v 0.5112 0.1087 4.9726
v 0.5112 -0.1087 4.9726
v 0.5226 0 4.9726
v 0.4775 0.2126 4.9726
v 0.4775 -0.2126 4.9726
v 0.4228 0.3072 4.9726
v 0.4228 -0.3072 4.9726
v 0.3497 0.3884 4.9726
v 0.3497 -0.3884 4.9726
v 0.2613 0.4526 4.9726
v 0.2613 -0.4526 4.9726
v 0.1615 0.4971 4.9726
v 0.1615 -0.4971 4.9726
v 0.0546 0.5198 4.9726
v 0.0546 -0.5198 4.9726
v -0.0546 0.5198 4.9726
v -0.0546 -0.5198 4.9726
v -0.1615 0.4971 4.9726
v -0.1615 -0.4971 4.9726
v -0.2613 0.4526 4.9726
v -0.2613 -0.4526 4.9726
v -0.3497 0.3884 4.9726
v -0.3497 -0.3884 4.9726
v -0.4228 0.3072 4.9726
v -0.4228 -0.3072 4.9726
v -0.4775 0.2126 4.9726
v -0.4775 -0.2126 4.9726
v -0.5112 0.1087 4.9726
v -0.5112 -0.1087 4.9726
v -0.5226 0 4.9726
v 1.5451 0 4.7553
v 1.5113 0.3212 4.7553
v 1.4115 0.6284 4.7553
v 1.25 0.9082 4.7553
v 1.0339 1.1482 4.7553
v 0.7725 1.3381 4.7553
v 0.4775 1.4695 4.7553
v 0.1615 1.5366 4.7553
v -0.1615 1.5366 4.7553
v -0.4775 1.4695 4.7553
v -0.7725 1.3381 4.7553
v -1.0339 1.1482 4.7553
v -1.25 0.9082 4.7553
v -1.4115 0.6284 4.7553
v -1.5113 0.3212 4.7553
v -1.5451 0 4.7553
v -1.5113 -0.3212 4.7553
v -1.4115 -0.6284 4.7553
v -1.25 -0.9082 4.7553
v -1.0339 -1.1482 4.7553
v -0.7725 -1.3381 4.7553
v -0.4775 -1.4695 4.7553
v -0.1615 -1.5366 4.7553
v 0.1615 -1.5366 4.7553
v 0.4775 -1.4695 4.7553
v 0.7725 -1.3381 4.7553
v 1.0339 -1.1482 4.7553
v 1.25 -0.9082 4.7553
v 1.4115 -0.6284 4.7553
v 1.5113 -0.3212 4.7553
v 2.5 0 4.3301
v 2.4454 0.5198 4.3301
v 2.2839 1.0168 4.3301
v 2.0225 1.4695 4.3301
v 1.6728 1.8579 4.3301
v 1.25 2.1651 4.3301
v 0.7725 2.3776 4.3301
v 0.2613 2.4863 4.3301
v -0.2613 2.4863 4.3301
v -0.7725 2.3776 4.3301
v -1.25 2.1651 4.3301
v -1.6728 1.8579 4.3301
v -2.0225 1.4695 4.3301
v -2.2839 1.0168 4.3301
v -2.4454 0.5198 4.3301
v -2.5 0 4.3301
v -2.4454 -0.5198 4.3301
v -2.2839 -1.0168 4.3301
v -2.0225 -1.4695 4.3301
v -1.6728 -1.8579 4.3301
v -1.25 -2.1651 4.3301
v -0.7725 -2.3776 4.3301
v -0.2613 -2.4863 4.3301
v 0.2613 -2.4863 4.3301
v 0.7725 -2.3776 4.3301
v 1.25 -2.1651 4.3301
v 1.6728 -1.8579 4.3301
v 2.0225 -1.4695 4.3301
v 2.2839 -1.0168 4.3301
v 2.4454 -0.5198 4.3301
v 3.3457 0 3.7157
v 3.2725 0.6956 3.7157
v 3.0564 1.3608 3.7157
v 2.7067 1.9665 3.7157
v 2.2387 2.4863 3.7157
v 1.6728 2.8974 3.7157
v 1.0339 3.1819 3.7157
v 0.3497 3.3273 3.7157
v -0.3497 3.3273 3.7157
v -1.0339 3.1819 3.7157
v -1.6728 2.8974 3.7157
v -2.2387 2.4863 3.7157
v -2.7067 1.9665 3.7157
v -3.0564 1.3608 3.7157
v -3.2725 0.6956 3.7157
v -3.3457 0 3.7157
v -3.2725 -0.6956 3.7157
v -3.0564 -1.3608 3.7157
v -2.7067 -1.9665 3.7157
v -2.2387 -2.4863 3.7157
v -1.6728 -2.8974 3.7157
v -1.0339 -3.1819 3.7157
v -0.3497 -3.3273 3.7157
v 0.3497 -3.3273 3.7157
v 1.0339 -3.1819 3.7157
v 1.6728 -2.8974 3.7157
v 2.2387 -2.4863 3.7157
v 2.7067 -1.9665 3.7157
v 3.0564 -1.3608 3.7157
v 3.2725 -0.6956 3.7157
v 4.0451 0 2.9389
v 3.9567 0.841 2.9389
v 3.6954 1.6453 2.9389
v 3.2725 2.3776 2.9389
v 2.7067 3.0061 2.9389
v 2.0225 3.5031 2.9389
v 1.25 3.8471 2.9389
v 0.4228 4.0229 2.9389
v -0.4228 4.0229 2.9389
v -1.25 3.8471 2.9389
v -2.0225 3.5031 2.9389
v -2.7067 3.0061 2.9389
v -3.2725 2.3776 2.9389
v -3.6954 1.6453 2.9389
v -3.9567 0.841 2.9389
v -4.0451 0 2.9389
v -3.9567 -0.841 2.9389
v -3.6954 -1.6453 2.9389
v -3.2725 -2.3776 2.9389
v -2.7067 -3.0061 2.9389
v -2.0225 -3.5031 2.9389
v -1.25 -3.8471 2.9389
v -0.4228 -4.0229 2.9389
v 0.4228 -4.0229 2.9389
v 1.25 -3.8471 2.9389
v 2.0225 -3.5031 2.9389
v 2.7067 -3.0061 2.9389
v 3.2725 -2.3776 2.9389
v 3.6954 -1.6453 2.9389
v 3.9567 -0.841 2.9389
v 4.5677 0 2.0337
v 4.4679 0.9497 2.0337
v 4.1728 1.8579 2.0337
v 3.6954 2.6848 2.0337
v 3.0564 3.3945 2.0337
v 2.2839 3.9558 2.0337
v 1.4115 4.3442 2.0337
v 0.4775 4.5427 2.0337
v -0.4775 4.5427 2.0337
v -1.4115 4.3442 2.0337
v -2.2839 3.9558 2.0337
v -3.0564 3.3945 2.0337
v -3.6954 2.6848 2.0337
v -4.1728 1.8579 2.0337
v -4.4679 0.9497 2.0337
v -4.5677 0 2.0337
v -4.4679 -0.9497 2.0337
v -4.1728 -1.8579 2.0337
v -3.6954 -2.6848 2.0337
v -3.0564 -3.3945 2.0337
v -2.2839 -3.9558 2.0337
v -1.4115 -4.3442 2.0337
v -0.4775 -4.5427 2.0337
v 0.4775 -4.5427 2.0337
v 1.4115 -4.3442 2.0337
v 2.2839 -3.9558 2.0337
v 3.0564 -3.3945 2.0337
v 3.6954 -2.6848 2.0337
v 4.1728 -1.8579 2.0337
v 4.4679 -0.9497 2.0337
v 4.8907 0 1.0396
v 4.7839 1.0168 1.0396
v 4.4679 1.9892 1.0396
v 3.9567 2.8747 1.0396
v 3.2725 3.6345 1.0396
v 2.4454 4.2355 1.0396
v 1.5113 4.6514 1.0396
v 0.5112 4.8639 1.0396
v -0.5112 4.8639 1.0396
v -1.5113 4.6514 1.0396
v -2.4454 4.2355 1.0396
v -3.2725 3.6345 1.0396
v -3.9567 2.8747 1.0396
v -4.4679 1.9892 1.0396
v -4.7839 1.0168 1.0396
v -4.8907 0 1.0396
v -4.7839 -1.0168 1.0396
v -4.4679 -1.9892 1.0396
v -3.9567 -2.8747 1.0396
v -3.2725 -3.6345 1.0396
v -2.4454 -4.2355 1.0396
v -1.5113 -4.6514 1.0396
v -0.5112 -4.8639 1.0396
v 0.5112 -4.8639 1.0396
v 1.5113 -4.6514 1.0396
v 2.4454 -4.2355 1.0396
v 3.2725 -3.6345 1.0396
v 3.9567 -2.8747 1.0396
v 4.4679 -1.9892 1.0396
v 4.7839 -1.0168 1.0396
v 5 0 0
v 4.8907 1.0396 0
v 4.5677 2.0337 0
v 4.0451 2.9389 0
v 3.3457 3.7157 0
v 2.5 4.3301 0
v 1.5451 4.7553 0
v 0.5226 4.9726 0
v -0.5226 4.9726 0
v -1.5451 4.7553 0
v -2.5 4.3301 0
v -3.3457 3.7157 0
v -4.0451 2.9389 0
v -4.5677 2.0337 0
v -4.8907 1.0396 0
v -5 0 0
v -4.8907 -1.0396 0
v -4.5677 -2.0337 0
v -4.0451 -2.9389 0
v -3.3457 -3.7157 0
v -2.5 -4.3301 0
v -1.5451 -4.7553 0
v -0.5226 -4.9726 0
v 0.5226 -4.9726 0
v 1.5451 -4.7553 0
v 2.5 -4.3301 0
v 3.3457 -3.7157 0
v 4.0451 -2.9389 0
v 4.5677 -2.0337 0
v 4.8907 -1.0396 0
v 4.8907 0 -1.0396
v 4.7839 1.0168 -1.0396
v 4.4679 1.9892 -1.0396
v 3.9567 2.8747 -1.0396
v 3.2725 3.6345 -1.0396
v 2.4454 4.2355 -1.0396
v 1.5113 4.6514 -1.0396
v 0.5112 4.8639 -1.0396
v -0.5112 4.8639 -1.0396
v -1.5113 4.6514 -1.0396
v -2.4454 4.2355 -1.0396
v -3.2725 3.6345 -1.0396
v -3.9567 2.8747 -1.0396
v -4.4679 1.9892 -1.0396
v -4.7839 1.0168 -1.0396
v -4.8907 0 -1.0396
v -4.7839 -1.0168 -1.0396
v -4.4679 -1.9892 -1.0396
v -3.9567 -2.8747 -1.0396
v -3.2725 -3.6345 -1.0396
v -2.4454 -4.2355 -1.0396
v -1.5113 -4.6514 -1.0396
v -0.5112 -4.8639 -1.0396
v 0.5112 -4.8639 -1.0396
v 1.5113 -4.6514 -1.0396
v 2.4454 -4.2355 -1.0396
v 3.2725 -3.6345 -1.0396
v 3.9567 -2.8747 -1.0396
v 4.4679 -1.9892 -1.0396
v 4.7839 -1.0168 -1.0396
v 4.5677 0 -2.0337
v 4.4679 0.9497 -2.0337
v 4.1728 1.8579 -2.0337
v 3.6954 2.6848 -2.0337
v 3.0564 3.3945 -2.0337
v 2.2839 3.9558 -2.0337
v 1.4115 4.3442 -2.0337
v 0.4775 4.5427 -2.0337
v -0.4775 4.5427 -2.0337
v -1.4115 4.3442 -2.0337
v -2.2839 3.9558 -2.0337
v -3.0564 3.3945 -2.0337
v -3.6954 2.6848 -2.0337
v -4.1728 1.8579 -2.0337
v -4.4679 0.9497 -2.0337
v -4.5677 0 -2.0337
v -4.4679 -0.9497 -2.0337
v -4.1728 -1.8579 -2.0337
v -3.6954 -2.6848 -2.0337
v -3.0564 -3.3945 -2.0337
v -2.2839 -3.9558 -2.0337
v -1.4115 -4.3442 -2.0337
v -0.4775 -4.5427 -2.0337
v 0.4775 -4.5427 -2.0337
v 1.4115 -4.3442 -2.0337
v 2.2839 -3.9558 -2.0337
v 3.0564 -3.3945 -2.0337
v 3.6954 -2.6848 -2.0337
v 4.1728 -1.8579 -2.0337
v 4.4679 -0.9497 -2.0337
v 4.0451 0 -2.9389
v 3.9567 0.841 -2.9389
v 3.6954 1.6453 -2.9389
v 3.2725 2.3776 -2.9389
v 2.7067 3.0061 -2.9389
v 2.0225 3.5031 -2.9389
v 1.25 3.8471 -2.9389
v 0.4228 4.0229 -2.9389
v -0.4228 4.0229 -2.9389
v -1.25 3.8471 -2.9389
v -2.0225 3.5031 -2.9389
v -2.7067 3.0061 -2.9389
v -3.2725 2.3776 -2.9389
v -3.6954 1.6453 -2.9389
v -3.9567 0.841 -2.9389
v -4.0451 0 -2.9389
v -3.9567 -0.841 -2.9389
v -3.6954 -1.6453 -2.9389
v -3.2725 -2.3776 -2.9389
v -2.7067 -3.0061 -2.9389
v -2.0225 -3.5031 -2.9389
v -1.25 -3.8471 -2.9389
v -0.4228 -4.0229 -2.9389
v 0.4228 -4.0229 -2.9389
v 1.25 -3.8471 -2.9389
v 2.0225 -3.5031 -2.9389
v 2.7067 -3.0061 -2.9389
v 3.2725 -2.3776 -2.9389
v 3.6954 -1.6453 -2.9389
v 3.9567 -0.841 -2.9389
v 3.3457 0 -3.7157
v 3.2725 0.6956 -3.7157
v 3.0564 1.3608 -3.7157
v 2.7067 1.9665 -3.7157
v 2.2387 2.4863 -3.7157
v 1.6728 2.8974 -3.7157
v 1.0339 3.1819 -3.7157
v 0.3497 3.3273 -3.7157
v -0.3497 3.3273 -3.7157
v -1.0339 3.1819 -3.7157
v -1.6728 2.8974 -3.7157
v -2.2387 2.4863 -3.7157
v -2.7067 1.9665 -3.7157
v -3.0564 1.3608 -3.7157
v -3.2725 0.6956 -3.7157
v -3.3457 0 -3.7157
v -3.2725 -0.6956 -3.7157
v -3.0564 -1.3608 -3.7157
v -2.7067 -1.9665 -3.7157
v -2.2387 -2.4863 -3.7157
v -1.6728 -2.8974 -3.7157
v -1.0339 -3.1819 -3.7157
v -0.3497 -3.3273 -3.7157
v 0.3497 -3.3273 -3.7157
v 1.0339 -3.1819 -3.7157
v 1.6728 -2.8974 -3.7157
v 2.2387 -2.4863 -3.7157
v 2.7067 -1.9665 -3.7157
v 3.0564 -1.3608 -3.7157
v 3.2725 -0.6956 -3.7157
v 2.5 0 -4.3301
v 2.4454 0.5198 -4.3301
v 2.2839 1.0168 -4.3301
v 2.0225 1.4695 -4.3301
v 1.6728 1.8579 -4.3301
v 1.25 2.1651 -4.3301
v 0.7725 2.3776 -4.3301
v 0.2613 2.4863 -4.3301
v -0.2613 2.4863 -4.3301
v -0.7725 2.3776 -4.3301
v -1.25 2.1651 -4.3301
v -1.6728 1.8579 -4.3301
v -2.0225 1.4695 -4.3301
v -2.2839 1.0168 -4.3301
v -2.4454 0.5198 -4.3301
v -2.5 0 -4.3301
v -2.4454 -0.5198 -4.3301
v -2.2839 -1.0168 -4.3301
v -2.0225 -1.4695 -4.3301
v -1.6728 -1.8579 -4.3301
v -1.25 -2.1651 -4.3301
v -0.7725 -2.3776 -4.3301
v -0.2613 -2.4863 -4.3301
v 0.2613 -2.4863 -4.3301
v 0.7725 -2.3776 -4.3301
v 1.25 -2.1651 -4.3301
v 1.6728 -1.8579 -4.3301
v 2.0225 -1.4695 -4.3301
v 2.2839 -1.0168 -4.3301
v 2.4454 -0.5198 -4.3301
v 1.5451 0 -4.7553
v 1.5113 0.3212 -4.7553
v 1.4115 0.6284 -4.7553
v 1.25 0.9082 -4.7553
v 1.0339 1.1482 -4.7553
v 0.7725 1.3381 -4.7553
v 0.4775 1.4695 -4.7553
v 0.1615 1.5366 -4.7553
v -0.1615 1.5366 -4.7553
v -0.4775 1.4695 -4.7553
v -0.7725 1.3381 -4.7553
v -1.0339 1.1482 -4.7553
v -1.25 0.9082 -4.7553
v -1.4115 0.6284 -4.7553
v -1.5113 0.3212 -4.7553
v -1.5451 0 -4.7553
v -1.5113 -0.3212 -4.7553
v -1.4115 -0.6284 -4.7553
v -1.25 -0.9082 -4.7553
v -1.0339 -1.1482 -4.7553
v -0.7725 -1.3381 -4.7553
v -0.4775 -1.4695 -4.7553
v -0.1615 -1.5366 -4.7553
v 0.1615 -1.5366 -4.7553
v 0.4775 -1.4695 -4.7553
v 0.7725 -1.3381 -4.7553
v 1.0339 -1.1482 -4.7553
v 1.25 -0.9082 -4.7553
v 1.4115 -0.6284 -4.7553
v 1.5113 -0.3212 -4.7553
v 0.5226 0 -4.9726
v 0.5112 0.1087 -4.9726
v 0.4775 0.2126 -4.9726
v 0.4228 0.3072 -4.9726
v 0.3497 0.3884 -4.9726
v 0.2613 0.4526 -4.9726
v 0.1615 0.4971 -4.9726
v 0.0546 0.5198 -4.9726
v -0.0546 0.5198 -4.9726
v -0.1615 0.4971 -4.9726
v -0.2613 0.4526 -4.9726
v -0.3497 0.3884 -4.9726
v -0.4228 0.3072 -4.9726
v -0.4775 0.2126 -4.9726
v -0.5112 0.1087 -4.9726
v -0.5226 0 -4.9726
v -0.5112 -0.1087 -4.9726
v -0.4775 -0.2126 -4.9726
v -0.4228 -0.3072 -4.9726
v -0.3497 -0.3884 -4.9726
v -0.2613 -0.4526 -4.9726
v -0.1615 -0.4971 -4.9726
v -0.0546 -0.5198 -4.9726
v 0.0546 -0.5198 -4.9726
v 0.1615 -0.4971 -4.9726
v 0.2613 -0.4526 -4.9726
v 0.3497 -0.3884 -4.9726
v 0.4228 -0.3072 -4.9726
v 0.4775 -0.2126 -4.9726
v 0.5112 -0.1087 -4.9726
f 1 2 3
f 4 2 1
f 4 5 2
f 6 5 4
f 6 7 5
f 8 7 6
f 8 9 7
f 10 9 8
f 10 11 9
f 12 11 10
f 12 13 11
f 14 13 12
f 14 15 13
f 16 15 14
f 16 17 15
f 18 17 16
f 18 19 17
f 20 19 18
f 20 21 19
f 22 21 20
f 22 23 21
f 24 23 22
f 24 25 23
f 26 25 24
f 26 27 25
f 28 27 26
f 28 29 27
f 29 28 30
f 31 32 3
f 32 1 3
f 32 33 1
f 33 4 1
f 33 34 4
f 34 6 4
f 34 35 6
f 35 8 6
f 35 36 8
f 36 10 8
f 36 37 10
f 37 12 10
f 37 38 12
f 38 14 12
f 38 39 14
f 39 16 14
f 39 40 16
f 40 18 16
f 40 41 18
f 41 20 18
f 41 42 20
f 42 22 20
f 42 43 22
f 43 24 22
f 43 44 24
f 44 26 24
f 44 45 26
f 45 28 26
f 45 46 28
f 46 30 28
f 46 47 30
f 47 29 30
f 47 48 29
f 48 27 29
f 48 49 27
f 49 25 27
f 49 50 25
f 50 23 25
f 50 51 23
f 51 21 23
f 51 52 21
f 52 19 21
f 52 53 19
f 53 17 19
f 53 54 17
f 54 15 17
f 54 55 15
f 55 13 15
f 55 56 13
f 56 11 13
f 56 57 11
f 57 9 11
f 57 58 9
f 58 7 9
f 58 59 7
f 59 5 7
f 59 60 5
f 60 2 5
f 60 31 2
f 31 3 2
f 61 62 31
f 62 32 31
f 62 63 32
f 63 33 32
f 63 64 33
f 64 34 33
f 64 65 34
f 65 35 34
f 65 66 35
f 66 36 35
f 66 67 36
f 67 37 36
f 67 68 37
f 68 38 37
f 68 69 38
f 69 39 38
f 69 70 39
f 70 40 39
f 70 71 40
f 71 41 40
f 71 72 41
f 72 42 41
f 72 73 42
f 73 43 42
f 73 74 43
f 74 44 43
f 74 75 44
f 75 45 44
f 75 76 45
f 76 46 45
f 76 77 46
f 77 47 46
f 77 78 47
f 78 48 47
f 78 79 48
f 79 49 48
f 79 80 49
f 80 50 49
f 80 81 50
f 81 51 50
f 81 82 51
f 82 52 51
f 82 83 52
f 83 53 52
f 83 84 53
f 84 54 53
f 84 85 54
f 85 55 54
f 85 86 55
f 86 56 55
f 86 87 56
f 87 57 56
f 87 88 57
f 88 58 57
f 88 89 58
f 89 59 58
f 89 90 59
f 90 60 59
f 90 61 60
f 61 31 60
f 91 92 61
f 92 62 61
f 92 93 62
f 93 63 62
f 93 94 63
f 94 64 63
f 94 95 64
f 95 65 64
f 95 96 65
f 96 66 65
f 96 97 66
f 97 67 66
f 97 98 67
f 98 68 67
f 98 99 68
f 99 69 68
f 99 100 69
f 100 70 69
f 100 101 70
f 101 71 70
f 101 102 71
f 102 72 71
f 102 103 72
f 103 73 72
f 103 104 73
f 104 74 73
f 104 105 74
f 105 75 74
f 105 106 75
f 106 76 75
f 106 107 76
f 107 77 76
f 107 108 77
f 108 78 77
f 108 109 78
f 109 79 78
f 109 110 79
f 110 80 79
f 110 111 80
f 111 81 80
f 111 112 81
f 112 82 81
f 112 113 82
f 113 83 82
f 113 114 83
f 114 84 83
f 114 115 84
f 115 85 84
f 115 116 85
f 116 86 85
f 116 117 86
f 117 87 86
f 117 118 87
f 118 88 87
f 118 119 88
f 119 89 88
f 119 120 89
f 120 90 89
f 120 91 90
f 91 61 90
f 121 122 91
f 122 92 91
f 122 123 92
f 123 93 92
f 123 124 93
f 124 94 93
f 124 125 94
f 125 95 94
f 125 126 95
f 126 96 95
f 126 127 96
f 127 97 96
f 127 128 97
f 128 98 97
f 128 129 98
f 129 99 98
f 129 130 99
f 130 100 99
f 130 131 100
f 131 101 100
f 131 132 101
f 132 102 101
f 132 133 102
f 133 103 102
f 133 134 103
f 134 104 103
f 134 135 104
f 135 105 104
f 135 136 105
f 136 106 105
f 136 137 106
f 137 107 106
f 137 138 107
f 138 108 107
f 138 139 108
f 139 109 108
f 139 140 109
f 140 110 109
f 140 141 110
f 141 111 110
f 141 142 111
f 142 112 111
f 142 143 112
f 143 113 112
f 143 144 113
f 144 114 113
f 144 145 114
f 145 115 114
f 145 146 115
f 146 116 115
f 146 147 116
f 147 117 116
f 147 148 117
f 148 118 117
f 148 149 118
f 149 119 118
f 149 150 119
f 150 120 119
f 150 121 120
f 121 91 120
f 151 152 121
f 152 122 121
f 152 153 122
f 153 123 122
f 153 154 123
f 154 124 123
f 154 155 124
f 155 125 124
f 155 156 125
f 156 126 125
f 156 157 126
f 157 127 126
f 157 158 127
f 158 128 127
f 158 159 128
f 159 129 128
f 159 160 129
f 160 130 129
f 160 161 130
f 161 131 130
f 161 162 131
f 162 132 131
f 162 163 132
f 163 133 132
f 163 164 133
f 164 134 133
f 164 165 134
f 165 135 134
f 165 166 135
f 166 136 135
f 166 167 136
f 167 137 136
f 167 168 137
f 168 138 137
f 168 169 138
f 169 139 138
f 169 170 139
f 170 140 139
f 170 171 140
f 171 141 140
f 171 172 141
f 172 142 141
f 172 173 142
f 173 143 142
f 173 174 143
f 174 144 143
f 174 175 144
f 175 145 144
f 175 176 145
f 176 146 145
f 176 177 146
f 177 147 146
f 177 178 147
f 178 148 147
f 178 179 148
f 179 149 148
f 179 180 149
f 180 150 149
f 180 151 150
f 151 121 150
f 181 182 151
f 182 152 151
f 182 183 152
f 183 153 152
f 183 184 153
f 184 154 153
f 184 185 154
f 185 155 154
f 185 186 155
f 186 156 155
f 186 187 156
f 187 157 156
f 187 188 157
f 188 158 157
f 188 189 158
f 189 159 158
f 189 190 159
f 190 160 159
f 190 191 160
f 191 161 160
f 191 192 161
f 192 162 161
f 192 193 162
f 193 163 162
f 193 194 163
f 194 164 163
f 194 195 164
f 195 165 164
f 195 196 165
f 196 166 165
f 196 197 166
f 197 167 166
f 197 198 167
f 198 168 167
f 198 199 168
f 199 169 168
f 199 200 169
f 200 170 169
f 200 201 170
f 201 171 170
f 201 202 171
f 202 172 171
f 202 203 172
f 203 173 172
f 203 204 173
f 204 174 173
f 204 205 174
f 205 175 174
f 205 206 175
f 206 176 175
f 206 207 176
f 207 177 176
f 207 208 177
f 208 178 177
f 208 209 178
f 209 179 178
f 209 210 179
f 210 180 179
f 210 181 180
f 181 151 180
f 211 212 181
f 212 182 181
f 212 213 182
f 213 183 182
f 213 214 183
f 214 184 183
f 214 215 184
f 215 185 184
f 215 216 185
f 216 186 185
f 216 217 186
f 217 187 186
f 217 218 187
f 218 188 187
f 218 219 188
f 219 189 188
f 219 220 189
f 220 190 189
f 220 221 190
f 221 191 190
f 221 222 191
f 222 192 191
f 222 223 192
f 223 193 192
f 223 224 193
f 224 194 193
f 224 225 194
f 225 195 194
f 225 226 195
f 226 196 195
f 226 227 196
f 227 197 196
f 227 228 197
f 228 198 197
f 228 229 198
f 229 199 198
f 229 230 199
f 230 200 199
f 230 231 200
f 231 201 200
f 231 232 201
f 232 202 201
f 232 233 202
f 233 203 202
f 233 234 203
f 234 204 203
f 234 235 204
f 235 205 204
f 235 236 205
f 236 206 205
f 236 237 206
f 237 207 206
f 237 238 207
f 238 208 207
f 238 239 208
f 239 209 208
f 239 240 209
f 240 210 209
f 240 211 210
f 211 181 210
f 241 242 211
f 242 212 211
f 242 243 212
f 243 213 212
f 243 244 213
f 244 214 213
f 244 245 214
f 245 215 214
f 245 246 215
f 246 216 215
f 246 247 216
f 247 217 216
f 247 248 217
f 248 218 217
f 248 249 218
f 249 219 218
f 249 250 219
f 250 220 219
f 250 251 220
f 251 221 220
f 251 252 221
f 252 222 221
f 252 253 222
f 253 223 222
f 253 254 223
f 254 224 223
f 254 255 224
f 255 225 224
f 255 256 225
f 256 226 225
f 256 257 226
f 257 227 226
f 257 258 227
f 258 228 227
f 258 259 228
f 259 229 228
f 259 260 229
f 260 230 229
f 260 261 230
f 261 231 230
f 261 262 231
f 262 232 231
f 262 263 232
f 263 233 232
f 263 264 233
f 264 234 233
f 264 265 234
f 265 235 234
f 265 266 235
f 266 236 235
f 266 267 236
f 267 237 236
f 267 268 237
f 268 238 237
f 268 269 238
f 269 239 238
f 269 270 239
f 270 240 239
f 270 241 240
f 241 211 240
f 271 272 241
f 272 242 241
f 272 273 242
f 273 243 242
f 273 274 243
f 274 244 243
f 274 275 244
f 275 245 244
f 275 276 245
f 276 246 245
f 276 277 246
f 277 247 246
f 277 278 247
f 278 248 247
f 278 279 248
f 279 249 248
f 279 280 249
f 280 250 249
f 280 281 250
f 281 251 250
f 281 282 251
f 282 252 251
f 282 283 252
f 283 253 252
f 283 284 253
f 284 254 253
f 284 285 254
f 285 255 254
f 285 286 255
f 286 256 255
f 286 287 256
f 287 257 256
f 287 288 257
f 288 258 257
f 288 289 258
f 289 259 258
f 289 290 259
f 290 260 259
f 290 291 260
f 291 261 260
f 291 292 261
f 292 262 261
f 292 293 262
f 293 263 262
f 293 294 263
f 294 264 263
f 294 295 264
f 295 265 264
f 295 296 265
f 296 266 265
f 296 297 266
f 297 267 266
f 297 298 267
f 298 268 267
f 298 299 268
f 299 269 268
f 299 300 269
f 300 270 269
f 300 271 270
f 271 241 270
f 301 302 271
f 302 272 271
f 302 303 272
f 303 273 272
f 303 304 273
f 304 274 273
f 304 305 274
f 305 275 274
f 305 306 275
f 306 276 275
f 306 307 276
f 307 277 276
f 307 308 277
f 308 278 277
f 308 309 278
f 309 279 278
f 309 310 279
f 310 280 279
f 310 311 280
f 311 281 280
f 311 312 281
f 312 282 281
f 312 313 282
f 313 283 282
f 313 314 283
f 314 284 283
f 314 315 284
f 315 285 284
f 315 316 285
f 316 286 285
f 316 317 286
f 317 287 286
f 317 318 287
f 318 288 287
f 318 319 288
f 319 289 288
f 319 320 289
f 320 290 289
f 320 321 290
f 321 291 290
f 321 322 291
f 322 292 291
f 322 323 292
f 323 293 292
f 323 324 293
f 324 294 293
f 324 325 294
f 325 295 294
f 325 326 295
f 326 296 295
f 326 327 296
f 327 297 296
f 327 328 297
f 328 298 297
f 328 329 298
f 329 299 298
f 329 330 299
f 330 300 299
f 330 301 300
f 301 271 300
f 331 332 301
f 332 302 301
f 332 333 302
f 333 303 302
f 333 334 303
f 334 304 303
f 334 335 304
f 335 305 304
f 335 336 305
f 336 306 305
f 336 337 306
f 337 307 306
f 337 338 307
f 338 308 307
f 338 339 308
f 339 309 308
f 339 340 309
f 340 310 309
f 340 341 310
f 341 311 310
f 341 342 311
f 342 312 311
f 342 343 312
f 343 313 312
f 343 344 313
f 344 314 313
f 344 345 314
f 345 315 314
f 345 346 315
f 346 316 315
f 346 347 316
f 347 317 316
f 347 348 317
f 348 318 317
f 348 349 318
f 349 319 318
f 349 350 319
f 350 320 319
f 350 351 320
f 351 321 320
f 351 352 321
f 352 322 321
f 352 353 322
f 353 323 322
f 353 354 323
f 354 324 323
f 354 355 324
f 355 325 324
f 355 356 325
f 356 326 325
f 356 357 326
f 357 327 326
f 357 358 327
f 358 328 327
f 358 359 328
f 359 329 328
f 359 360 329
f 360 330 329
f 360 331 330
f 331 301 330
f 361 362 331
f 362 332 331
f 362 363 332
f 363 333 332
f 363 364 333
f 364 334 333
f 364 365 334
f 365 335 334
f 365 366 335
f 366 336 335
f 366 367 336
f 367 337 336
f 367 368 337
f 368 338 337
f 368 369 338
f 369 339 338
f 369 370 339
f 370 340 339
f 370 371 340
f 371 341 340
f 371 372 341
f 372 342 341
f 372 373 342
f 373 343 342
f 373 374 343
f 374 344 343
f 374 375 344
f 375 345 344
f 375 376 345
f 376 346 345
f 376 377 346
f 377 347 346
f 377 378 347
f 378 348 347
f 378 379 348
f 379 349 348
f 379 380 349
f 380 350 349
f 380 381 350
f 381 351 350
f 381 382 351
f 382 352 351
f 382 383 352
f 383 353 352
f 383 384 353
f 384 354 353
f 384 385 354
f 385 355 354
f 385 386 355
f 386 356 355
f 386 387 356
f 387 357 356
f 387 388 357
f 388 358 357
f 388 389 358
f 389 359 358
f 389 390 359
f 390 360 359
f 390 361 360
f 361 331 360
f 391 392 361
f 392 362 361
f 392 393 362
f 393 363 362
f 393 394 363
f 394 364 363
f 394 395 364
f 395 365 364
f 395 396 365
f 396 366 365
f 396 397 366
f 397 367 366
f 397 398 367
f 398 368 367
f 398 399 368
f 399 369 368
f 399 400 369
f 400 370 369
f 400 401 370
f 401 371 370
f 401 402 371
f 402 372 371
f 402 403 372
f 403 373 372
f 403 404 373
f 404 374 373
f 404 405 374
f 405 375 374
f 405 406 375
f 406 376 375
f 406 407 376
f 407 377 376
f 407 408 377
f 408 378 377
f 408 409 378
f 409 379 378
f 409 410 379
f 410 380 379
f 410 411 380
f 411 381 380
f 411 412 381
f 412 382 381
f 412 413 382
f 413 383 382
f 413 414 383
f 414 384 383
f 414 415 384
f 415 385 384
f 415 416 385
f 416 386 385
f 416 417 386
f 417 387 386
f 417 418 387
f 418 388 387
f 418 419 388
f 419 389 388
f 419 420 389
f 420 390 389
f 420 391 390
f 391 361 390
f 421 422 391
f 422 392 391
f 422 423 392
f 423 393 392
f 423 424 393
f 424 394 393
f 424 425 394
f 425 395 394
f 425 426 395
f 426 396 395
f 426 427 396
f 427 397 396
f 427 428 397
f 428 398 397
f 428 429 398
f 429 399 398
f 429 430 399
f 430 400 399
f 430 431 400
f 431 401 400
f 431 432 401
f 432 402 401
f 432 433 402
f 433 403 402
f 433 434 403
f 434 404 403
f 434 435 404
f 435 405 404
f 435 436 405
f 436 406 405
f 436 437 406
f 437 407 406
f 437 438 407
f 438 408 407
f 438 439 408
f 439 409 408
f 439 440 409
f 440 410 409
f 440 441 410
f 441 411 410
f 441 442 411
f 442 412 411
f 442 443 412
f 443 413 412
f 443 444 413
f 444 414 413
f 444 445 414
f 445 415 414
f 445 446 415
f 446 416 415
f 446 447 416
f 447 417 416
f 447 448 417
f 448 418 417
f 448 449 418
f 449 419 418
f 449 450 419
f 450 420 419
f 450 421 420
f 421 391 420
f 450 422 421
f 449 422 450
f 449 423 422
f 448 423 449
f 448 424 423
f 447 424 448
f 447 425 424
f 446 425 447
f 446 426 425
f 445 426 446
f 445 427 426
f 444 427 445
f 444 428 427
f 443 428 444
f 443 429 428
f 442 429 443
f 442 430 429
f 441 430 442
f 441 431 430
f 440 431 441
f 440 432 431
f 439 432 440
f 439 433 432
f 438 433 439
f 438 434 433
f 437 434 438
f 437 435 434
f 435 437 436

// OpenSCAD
x_step = 1;//[-500:500]

y_step = 1;//[-500:500]

z_step = 1;//[-500:500]

Radius = 5;//[1:500]

Radius_of_Botom = 5;//[1:500]

Sides = 30;//[3:500]



scale(x_step, y_step, z_step) sphere(Radius, $fn = Sides);
